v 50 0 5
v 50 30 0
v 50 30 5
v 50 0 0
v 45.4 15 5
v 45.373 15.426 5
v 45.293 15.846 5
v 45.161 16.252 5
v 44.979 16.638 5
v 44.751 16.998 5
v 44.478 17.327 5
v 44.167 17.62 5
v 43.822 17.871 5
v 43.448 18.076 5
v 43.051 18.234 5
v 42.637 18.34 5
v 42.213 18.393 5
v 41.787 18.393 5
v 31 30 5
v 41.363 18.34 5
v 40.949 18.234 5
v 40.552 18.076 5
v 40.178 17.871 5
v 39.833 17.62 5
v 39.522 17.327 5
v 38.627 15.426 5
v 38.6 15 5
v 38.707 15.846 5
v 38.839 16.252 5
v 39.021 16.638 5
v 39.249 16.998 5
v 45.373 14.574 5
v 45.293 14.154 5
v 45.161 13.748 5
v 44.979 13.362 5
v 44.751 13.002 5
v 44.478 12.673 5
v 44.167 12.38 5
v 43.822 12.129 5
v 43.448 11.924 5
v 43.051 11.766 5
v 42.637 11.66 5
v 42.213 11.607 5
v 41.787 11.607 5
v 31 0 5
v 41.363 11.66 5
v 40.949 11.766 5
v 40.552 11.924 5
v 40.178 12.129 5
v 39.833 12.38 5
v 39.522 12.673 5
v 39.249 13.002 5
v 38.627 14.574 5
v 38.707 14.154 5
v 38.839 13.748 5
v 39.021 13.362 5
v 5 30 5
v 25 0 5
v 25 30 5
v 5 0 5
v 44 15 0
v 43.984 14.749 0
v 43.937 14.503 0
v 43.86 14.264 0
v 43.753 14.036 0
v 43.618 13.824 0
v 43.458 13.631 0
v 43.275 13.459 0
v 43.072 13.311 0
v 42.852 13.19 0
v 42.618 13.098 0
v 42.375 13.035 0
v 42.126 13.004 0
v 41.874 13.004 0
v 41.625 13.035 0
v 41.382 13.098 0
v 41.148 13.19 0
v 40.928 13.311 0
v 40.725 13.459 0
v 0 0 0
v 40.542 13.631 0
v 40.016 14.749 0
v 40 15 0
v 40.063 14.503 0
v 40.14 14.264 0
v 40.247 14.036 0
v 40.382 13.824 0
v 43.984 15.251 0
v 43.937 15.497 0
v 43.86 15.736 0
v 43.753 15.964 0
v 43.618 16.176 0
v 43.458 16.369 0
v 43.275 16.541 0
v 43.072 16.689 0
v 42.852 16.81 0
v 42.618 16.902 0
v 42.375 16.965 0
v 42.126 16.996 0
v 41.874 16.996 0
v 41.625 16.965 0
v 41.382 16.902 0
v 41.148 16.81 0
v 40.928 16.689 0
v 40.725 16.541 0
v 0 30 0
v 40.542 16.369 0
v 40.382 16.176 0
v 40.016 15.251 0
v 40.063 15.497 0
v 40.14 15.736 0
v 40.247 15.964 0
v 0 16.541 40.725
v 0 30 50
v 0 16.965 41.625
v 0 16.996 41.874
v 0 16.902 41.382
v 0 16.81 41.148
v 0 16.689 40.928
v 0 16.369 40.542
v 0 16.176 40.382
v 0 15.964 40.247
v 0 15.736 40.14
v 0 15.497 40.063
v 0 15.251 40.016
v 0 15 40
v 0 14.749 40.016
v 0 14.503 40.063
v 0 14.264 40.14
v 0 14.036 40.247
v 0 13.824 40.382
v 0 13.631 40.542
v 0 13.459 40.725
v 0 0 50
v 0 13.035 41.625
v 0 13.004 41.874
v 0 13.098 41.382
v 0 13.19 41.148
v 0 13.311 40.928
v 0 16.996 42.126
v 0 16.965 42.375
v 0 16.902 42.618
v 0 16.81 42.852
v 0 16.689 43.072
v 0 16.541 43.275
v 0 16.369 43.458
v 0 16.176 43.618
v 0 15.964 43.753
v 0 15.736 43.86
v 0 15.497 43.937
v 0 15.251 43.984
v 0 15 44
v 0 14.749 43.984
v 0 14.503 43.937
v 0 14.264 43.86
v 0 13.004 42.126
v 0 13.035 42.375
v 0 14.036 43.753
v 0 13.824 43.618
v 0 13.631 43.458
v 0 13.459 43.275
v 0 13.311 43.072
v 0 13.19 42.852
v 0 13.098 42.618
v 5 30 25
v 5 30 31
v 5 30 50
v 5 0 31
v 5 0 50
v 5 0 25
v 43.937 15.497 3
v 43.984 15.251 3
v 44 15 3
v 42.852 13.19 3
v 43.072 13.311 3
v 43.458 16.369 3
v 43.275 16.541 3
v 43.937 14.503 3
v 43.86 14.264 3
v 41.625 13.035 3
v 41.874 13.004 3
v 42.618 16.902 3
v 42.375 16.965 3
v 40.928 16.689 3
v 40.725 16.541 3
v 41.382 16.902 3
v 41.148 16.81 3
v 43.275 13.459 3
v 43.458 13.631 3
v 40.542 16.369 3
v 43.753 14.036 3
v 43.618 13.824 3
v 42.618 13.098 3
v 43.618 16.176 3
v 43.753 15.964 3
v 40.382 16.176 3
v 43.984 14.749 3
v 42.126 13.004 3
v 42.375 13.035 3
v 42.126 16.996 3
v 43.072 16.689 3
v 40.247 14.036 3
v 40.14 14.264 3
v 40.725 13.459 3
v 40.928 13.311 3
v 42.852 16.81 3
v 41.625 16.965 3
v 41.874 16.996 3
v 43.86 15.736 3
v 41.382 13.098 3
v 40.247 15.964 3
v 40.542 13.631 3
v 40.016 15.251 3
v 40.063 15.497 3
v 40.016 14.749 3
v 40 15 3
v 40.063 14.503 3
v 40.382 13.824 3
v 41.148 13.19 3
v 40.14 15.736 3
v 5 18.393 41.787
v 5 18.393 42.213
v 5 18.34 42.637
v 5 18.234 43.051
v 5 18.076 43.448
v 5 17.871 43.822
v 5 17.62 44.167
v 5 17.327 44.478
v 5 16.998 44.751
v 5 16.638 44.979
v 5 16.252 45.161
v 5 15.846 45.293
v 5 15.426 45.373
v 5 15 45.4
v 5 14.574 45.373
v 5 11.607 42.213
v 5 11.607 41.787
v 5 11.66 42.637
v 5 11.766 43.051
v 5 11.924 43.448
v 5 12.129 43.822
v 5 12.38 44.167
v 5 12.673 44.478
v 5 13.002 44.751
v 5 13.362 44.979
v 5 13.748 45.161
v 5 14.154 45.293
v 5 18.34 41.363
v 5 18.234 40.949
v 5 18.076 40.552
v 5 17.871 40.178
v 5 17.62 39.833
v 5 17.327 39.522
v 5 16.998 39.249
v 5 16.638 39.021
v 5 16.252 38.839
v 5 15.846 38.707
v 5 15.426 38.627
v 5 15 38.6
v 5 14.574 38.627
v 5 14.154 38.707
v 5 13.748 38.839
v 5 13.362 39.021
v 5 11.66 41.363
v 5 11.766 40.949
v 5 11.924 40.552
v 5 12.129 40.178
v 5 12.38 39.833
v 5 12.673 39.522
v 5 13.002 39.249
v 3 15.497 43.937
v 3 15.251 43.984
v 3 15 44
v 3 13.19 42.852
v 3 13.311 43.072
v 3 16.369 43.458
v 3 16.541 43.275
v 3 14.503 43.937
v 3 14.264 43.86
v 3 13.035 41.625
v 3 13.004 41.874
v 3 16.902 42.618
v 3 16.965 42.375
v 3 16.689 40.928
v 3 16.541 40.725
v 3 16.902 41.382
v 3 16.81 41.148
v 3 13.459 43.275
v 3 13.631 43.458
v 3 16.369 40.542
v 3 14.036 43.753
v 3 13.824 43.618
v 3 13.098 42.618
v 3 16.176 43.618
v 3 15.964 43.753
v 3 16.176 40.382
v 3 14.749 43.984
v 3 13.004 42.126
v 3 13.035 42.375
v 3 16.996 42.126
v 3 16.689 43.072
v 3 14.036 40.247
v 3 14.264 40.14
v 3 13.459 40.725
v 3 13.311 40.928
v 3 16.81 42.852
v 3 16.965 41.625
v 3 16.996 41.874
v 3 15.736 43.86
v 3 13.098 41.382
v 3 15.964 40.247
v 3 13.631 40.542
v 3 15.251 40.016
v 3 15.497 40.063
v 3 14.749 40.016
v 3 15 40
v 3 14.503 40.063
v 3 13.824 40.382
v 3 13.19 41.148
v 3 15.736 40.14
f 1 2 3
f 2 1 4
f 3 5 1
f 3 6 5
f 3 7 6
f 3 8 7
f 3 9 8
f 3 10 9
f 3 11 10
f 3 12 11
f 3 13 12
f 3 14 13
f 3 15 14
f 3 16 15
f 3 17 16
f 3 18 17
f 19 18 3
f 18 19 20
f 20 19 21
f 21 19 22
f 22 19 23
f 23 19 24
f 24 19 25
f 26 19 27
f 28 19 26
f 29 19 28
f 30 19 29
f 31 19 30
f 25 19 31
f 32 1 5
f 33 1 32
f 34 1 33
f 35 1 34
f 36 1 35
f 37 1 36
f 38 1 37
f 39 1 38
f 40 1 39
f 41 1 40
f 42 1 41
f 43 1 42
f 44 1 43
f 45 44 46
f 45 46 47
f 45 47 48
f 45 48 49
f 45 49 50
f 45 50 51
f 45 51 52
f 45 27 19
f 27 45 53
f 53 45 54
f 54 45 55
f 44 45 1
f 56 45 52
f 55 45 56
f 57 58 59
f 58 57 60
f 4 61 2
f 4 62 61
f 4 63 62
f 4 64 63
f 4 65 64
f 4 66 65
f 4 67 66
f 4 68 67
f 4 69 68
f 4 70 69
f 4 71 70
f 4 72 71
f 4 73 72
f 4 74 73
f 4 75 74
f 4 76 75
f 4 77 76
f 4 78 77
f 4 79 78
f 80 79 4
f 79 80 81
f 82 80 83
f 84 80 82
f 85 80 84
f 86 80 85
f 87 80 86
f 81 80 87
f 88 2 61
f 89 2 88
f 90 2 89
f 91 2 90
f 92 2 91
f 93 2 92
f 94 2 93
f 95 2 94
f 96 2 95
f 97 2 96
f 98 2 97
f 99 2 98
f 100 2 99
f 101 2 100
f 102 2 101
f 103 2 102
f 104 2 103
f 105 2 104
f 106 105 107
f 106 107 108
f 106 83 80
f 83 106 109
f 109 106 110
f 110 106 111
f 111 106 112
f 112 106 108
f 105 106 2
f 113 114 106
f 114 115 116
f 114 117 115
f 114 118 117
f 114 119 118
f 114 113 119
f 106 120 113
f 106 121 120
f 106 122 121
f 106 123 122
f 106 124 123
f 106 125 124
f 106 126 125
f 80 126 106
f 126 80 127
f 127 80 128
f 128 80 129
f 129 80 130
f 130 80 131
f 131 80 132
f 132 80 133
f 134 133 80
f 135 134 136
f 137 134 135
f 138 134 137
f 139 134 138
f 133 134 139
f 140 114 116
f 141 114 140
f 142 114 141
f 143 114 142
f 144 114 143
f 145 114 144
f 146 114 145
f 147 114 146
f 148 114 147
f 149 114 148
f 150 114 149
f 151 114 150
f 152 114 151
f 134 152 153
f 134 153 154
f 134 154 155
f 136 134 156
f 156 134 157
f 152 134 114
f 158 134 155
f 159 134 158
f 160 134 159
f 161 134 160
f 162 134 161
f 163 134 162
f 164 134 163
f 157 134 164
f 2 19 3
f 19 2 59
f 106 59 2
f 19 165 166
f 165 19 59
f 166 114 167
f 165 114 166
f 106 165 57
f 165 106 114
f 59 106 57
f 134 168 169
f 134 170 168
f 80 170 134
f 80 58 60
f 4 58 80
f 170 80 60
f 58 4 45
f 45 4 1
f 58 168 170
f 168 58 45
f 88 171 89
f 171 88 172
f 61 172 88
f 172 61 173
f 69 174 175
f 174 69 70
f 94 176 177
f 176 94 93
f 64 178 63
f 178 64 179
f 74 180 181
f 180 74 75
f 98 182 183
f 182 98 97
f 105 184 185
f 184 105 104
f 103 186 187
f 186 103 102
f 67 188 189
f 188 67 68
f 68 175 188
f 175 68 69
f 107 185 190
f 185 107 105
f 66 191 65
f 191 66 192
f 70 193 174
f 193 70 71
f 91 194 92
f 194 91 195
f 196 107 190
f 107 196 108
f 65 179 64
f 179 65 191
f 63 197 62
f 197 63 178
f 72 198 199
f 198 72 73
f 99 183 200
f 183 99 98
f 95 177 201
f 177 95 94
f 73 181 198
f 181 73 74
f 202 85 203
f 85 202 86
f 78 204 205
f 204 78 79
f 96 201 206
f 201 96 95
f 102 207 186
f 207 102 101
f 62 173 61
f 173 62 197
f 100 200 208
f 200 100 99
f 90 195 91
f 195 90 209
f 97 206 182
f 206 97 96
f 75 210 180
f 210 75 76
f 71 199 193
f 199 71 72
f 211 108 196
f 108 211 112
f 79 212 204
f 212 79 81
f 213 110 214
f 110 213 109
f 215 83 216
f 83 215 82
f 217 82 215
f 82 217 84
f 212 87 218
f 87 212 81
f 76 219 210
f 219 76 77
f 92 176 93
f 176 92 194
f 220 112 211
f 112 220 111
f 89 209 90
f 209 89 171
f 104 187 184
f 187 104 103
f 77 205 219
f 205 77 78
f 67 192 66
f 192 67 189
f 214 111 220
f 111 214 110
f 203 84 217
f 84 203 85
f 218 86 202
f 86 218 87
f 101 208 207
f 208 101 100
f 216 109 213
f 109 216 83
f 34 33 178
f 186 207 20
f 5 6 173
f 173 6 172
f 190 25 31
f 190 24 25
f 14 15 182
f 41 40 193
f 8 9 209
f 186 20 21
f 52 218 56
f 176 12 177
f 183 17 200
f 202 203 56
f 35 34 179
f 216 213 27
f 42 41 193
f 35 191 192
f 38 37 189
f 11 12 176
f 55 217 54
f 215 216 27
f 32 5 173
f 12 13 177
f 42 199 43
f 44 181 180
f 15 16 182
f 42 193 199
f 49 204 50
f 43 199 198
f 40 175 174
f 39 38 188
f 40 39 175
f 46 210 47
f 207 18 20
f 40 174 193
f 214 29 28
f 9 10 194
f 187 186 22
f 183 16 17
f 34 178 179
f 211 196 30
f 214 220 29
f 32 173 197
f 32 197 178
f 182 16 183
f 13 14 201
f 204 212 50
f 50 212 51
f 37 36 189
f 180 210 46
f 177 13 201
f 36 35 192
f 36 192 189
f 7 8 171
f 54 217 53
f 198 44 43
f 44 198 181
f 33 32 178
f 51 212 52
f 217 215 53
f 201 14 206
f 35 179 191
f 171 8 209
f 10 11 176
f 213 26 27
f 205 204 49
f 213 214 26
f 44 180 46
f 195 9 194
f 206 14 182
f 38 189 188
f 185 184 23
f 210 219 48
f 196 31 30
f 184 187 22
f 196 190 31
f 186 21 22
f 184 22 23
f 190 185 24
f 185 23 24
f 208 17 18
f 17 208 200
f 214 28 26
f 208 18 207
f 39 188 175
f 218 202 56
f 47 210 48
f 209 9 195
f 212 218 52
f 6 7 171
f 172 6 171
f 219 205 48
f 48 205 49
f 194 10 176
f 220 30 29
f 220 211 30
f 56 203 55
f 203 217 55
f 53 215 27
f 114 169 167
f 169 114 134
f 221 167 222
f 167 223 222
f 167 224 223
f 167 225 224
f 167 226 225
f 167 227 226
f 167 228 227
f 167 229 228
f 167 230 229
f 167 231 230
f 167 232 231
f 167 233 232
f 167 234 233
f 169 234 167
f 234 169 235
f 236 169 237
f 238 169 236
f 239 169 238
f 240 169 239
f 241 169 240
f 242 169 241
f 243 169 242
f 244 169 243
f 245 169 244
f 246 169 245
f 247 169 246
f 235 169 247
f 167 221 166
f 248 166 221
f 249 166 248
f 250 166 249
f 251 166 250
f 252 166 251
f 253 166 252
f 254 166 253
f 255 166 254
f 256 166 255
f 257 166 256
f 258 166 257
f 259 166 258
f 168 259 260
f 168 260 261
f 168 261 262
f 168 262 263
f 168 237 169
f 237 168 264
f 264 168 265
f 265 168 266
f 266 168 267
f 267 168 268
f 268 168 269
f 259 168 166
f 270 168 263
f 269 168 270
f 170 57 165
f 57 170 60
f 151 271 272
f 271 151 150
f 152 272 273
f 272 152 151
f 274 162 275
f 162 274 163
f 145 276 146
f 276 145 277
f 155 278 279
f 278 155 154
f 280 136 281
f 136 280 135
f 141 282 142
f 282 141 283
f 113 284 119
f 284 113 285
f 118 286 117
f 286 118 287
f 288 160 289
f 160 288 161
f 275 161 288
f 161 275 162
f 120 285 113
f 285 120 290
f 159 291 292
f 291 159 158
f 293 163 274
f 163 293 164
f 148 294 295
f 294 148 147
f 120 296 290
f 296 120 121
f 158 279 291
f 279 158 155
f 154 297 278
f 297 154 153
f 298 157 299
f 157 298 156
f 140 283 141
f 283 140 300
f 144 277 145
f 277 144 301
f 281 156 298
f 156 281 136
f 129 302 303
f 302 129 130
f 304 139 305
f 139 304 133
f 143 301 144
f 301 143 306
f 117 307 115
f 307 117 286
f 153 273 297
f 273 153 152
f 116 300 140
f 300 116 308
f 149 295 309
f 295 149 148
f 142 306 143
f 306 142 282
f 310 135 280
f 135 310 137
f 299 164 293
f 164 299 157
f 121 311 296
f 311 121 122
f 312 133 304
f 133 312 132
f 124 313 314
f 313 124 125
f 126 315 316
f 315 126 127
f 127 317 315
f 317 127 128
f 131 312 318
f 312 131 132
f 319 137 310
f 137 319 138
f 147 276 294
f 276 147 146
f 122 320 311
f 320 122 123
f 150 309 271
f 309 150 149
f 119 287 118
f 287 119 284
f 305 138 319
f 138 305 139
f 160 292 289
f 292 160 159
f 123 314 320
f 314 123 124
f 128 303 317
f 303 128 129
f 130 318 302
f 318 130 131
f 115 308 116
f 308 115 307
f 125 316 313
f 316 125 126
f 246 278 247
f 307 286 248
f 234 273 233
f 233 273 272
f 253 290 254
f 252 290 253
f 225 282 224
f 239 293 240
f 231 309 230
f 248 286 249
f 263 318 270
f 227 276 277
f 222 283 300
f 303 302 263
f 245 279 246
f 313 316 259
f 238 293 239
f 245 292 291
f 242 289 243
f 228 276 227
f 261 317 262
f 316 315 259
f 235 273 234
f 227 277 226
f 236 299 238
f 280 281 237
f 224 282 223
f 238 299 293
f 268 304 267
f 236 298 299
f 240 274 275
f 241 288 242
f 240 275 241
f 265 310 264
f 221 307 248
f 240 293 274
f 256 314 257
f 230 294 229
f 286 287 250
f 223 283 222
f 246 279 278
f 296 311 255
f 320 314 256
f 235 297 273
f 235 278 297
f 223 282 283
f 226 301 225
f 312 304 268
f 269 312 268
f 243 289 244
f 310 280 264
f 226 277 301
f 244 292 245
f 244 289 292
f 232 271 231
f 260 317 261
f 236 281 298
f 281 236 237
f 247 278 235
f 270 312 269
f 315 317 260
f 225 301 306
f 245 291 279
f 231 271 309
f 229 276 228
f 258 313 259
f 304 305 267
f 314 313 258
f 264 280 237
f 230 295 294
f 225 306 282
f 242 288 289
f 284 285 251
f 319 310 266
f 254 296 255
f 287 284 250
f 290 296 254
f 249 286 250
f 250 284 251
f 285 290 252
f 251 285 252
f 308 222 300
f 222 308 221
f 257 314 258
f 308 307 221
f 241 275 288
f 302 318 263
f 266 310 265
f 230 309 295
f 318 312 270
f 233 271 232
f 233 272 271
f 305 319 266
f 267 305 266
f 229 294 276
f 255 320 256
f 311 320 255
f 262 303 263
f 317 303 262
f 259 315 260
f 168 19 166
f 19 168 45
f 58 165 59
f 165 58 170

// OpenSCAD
/*CREATED BY PASZIN*/

//Thickness of all elements
thickness = 5; // [1:15]

//Length of vertical arm
len1 = 50; // [10:100]
//Length of horizontal arm
len2 = 50; // [10:100]
//Width of angle section
width = 30; // [5;100]

//Diameter of a hole centered at the end of the arms (You can use it for srews)
hole_diameter = 4;
hole_diameter_top = hole_diameter + hole_diameter*0.7;

$fn=50*1;

module one_side(cx, cy, cz, hd, invert=1) {
    difference() {
        cube([cx, cy, cz]);
        translate([cx-hd*2, width/2, -1])  cylinder(d=hd, h=cz+2);
        translate([cx-hd*2, width/2, cz-2])  cylinder(d1=hd, d2=hole_diameter_top, h=2);
    }
    
    
}


module angle_profile() {
        

    mirror([1,0,0]) rotate([0,-90,0]) one_side(len1, width, thickness, hole_diameter, -1);
   one_side(len2, width, thickness, hole_diameter);
    hull() {
        mirror([1,0,0]) rotate([0,-90,0])  translate([len1-hole_diameter*5, 0, 0])  cube([thickness, width, 1]);
        translate([len2-hole_diameter*5, 0, 0])  cube([thickness, width, 1]);
        
        
        }
    
    
    
    }


angle_profile();
    
    
